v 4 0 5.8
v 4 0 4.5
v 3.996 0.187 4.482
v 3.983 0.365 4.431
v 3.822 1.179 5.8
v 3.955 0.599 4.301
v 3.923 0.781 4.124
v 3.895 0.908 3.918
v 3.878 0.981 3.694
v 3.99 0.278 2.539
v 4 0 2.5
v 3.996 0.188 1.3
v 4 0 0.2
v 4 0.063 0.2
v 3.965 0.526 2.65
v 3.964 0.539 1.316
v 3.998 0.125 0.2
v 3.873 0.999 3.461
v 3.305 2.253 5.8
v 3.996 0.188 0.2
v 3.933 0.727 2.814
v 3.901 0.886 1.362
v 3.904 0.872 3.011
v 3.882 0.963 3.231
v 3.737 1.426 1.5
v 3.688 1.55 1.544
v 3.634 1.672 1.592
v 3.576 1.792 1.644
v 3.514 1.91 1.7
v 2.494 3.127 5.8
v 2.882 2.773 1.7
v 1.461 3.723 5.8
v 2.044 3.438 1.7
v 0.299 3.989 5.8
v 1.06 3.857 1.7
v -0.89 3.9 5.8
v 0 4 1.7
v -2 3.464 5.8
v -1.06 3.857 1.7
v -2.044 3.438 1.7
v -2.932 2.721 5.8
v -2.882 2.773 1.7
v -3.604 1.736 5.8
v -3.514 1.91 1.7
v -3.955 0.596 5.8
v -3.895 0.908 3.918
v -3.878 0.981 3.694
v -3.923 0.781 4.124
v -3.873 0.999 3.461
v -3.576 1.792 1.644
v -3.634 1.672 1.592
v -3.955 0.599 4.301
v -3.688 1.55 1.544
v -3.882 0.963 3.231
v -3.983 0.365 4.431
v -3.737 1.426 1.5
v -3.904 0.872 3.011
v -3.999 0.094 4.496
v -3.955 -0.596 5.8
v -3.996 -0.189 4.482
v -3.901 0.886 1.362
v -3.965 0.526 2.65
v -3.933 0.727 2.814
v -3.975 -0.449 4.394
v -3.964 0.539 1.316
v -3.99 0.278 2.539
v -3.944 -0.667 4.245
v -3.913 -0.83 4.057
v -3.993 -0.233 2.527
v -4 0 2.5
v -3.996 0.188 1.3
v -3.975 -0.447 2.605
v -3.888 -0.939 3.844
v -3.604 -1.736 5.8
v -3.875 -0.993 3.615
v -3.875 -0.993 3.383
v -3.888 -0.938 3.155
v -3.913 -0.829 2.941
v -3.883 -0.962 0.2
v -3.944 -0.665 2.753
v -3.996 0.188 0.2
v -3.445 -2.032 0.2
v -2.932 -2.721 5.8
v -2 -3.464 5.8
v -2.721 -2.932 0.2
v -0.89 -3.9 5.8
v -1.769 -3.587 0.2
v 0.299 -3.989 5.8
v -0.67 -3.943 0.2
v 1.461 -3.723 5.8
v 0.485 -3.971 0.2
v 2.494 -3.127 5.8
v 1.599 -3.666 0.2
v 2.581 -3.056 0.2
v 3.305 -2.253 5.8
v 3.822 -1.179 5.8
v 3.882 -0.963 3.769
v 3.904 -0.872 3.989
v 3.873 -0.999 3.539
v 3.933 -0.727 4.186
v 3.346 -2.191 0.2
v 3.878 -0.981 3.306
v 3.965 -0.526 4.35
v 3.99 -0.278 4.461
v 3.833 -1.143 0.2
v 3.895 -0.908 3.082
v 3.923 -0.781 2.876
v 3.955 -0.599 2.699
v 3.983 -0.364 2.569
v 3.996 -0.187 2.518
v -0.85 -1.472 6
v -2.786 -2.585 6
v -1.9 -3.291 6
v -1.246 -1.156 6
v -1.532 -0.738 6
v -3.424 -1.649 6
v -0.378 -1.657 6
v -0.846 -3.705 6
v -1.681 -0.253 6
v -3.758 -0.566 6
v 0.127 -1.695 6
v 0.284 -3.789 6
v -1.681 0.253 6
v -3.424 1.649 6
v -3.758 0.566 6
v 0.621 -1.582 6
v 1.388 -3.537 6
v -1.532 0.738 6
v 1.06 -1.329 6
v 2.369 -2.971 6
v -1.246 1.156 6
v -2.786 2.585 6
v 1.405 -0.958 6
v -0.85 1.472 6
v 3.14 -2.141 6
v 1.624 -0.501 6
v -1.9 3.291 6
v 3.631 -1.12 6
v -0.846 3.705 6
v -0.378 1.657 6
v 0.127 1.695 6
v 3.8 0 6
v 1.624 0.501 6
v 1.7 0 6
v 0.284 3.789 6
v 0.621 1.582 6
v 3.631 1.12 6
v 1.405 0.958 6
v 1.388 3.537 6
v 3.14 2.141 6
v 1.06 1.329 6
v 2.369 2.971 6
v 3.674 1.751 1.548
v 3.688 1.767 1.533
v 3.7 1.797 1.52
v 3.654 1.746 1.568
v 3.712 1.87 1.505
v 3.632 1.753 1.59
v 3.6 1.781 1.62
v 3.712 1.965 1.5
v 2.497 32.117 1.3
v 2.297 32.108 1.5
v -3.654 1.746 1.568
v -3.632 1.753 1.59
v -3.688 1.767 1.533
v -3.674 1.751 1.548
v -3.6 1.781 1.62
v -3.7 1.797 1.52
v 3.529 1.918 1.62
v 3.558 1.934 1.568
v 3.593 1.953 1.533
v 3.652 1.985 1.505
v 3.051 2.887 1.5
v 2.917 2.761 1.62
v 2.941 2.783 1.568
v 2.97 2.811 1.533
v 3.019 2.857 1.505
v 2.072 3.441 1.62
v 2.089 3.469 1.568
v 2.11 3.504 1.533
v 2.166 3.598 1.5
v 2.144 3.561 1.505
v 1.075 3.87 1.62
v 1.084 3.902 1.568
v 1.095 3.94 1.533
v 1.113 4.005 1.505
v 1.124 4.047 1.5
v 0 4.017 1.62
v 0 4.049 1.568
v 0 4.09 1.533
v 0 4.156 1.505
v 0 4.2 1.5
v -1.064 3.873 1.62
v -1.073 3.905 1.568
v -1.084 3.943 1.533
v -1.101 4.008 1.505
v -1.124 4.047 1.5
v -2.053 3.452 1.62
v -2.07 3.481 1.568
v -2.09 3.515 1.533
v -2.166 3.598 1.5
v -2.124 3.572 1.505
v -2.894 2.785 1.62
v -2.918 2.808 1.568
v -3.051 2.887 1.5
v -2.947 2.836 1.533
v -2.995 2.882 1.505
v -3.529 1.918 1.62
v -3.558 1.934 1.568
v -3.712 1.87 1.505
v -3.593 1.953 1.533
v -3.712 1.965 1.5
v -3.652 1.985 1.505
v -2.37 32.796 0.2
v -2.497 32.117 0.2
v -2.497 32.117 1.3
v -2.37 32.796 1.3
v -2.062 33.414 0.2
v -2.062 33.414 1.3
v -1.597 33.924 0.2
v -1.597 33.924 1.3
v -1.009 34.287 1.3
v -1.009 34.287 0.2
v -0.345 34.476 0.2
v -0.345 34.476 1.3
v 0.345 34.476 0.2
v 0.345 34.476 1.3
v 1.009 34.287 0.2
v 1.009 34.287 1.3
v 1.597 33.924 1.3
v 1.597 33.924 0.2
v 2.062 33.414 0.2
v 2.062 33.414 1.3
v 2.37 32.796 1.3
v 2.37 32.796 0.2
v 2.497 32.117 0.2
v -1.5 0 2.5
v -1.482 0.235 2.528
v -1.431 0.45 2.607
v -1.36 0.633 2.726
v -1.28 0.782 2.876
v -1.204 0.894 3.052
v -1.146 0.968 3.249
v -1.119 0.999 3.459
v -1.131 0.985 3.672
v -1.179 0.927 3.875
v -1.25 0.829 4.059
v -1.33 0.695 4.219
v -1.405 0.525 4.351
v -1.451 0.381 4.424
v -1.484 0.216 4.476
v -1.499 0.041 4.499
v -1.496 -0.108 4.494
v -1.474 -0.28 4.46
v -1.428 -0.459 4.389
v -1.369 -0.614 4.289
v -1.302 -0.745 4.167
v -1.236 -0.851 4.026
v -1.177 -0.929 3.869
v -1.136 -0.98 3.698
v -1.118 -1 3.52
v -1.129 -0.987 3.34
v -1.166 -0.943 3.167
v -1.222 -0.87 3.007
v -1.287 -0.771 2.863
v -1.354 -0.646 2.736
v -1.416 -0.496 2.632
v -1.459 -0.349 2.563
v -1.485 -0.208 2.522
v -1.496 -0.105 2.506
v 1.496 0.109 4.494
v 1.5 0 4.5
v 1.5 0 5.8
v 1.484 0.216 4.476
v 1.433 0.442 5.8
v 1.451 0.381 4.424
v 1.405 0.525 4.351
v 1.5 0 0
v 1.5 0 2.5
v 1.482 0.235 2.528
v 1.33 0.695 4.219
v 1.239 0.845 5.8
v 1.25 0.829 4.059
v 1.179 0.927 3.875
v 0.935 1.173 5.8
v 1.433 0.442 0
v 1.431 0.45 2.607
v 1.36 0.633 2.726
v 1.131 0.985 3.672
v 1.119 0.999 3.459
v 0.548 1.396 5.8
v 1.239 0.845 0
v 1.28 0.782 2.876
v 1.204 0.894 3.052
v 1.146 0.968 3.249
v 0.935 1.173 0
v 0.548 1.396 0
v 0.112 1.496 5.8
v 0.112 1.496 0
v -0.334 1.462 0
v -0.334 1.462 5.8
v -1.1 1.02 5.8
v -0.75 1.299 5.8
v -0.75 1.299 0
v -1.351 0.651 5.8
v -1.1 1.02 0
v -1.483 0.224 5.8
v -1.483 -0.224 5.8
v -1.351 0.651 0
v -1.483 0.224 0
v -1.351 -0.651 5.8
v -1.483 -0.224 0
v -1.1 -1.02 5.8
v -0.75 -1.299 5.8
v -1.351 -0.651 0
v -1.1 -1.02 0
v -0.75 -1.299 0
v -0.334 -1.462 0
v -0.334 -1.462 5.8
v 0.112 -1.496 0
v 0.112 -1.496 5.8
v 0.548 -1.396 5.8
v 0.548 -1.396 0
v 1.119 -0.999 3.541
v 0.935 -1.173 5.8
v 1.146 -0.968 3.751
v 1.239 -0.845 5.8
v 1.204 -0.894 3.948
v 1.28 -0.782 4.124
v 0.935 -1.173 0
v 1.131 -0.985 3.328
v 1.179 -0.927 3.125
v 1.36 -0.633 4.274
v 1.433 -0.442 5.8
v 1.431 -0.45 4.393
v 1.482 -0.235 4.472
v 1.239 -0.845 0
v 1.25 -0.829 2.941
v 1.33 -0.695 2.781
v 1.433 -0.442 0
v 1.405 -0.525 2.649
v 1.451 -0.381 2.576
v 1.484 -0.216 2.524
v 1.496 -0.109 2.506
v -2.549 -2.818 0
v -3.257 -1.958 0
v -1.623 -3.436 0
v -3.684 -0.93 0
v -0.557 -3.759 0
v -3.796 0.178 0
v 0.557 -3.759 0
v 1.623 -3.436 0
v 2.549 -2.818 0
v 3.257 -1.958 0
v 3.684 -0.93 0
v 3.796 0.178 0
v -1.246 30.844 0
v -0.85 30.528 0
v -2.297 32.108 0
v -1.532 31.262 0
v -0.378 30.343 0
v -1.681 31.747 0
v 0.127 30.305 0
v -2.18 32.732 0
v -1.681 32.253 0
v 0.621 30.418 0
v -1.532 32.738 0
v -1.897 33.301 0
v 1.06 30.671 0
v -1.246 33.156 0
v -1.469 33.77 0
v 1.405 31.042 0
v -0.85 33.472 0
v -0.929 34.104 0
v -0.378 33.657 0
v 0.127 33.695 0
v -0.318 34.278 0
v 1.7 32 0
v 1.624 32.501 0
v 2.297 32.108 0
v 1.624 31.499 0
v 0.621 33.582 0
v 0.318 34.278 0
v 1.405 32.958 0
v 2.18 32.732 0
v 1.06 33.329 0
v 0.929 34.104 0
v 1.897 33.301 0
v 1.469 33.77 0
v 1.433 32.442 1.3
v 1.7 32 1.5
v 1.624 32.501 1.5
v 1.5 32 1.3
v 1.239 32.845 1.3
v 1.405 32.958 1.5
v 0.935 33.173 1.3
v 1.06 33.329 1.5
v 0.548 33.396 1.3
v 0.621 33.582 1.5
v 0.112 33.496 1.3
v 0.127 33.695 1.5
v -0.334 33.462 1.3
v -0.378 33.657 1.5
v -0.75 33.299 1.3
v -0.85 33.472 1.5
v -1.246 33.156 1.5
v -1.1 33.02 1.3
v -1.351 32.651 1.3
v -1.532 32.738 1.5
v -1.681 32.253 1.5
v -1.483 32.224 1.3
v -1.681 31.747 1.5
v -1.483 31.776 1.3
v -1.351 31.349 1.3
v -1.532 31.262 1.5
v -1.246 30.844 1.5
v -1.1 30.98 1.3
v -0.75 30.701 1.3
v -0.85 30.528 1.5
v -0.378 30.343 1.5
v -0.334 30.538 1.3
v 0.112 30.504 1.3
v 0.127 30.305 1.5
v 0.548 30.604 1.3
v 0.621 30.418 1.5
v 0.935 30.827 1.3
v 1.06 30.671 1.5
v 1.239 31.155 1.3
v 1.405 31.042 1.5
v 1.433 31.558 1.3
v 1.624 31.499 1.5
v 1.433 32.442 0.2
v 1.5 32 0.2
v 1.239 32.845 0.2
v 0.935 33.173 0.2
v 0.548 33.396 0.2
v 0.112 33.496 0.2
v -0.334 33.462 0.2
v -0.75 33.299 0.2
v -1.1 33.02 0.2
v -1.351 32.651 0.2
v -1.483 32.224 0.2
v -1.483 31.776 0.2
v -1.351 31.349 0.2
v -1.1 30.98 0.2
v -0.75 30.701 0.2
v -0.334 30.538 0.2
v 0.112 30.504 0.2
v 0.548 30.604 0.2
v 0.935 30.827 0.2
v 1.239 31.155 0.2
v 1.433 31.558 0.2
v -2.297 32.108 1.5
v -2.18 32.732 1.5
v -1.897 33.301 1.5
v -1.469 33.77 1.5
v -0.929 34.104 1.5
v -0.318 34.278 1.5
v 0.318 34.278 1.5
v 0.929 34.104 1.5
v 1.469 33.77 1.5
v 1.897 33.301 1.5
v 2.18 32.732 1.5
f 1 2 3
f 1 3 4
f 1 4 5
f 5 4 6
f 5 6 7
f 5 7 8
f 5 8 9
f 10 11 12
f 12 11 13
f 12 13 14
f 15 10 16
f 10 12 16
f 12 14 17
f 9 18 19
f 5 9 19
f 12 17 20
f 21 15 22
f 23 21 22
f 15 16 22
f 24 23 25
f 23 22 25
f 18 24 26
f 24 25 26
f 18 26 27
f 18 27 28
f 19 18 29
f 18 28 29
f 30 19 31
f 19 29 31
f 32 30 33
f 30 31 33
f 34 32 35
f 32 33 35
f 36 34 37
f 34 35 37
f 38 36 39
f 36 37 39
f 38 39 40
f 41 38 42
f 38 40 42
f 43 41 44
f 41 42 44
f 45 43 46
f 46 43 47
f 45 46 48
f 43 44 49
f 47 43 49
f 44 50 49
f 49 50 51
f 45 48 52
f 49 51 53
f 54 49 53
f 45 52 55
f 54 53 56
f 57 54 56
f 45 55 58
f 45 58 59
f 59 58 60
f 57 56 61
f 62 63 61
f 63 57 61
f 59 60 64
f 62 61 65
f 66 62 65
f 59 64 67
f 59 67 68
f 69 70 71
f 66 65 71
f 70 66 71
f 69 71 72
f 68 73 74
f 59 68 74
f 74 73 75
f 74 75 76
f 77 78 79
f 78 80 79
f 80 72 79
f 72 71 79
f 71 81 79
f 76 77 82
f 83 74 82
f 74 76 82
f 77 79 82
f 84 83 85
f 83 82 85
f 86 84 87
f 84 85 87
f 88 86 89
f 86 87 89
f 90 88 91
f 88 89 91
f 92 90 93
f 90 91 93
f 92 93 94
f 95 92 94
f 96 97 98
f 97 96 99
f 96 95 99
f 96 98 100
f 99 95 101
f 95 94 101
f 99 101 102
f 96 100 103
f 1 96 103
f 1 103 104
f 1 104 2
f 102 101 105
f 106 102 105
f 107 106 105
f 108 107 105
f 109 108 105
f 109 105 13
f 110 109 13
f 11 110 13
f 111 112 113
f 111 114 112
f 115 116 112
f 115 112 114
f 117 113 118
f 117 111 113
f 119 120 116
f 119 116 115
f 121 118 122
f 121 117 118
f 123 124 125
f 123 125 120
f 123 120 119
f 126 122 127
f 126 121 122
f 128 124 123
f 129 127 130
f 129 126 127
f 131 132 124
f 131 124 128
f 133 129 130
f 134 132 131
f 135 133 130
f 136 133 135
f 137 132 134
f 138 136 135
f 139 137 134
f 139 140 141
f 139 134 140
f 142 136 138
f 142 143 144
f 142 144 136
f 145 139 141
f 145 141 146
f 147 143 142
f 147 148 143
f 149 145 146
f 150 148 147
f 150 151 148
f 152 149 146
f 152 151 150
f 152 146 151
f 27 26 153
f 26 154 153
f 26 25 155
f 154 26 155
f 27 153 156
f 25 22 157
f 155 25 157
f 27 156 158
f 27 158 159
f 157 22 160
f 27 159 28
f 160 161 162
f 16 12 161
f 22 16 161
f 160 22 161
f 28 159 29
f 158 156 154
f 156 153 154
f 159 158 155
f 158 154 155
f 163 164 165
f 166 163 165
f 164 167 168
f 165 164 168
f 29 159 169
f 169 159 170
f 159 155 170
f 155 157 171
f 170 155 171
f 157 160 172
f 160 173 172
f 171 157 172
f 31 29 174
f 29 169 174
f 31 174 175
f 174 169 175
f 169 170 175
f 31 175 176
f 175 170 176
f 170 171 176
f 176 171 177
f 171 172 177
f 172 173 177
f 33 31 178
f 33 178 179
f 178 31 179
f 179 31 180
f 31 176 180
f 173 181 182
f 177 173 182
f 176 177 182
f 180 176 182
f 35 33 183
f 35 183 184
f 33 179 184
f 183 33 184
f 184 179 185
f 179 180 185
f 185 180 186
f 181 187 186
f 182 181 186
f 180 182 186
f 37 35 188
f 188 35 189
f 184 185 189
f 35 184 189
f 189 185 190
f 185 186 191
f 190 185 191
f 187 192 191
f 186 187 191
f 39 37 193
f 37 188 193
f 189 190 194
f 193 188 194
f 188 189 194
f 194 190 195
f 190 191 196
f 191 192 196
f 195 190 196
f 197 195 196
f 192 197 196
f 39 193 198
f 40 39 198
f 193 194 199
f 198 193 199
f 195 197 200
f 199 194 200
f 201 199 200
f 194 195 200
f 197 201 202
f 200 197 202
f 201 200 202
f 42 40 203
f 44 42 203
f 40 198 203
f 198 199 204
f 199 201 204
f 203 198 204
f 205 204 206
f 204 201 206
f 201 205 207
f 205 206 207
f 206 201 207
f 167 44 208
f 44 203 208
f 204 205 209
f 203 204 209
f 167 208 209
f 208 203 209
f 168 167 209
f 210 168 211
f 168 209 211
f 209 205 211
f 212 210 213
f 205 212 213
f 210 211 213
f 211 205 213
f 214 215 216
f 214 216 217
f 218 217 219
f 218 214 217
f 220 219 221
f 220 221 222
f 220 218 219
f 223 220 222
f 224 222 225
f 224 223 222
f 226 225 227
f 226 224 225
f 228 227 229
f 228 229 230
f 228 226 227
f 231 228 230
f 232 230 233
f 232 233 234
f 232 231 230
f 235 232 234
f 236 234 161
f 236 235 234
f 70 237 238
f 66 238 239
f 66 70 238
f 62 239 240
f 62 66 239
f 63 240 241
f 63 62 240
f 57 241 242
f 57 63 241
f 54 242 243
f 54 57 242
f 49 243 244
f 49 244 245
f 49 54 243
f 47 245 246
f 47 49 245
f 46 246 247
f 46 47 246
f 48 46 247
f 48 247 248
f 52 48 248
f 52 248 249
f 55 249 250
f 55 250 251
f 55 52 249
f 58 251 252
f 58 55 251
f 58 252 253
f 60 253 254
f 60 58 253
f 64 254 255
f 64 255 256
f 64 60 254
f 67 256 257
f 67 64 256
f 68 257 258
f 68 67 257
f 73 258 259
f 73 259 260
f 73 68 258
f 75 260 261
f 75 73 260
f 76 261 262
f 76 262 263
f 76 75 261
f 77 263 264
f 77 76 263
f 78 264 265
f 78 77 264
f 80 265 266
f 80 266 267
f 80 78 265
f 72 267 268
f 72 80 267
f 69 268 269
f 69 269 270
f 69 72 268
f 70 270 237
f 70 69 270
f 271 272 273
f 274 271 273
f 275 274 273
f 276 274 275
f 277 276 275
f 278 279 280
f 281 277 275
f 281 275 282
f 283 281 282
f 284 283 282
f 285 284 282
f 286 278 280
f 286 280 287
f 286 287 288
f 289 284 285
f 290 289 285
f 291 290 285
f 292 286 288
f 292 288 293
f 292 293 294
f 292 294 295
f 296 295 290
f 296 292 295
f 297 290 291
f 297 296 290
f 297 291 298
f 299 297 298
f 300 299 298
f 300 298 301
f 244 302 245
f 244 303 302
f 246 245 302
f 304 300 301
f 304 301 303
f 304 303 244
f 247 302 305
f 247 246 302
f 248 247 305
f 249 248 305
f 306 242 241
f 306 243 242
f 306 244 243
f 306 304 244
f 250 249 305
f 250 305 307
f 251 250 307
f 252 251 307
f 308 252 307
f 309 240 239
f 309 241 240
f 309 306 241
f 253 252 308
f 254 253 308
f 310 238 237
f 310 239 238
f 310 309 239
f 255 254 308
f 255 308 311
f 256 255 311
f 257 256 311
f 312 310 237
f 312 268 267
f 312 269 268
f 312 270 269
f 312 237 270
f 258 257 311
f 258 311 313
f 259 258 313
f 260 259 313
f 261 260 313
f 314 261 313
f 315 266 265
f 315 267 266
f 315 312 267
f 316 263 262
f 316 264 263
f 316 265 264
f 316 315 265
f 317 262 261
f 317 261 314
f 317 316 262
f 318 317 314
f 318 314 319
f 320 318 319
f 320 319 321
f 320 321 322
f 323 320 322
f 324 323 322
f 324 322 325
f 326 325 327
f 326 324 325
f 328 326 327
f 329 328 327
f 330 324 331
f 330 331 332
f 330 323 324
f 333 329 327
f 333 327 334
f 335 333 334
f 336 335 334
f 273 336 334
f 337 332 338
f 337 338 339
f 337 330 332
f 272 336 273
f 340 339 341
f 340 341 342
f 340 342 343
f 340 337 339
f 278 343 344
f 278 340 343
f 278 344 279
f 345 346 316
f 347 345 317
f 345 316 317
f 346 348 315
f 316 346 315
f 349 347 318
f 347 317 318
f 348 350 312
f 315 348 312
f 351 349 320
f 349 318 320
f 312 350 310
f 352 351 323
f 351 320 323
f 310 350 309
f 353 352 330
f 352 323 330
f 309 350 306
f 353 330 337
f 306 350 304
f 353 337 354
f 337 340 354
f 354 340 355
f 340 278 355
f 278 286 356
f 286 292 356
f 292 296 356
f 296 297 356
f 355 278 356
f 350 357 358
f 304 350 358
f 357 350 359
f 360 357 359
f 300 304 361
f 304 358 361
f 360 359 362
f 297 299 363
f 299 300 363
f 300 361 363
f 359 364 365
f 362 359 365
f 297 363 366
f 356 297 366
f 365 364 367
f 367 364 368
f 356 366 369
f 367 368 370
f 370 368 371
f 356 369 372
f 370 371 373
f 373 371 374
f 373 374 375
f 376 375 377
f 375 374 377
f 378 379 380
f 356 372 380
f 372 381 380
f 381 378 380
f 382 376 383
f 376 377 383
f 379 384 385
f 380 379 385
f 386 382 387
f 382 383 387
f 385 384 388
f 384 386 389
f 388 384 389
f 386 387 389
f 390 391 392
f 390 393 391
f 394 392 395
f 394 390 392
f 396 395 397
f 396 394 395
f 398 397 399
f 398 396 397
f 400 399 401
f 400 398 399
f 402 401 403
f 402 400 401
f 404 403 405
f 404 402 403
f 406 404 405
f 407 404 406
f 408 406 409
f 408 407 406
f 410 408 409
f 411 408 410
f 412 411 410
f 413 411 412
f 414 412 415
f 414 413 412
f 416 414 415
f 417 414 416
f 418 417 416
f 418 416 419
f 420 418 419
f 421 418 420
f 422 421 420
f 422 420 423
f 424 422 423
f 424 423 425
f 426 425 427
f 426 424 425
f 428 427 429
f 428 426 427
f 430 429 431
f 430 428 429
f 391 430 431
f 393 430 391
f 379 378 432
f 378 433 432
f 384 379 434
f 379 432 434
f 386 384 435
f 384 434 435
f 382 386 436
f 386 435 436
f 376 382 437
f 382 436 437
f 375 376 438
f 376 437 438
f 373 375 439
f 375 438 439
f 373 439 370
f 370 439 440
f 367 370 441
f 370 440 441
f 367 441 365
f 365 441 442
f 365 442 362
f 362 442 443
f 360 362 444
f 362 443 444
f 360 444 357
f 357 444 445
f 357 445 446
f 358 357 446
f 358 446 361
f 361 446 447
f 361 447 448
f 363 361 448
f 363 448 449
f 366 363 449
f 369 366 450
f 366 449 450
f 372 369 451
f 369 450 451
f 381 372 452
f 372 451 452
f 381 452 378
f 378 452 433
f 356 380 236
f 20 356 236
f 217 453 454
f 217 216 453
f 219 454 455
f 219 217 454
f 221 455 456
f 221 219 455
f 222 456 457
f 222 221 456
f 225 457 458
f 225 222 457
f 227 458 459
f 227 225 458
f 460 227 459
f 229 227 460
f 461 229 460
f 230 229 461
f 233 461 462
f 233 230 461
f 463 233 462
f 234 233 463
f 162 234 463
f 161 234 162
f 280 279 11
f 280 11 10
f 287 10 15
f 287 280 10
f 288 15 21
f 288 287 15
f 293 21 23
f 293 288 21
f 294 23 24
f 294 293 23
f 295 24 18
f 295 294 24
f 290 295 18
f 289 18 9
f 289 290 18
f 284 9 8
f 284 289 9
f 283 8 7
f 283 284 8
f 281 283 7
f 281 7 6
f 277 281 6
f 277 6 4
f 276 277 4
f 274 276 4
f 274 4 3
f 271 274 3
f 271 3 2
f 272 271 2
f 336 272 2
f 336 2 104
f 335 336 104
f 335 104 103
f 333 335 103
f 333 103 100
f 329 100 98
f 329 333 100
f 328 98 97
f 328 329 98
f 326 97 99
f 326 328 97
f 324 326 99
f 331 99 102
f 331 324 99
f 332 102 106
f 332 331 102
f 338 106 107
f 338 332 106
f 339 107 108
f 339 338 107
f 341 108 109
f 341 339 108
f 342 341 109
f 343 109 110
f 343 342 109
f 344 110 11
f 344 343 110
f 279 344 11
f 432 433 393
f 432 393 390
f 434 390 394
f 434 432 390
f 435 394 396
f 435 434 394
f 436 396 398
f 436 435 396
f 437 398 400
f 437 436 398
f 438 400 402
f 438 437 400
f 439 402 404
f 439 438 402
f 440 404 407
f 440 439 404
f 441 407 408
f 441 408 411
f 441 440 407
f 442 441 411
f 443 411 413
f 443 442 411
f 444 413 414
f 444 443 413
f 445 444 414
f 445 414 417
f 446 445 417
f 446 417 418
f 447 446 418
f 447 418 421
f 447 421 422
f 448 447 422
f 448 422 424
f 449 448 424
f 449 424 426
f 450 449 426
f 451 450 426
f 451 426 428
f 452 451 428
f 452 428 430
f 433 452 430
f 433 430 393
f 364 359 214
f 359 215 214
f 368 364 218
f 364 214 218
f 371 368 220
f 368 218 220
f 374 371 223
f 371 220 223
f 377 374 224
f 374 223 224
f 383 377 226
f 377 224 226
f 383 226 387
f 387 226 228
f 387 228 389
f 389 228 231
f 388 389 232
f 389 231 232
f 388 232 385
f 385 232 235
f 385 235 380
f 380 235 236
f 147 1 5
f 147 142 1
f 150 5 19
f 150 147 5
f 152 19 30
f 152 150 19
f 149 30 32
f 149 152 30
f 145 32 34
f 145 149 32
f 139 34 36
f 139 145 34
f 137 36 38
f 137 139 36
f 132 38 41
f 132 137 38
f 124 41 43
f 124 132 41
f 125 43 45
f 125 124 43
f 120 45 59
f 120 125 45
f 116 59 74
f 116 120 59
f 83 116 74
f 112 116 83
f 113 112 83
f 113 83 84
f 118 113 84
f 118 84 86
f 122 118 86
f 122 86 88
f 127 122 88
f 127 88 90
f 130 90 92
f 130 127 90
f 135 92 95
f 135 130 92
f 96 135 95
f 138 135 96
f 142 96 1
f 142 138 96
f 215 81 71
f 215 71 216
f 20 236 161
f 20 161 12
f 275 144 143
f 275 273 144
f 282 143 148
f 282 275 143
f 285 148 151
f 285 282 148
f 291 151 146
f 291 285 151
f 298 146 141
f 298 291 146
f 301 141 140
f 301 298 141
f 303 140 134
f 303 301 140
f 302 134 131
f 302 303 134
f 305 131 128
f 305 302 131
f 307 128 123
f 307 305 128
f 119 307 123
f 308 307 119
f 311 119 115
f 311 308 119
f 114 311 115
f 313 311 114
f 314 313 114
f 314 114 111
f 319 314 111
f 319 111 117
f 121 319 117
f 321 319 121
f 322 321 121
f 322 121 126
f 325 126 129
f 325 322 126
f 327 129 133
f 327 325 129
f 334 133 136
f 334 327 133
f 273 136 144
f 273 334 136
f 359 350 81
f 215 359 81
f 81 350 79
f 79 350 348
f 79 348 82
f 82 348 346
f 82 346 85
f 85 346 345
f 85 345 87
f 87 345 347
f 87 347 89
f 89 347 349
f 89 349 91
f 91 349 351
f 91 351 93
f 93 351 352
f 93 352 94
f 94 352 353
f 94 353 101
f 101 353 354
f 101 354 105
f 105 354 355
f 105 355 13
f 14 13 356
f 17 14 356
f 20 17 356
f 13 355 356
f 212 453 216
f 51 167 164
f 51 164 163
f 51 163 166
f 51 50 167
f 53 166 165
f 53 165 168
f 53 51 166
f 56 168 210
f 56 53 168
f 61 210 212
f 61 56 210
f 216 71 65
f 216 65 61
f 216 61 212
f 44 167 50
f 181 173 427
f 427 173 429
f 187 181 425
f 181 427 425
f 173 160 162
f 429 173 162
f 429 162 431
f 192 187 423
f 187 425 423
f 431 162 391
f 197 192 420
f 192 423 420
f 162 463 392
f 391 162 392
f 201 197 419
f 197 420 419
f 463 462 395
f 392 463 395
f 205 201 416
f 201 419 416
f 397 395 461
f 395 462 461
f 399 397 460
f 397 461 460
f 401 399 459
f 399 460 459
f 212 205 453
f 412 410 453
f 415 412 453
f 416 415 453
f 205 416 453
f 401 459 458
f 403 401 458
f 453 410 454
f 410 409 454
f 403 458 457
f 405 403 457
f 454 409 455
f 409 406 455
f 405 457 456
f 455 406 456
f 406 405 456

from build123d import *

# Parameters (mm, degrees)
SKETCH1_R               = 4
SKETCH1_R_2             = 1.5
BOSS_EXTRUDE1_DEPTH     = 6
SKETCH2_R               = 1.5000000000000004
BOSS_EXTRUDE2_DEPTH     = 1.5
CUT_EXTRUDE1_DEPTH      = 36.245567097154215
CUT_EXTRUDE1_DEPTH_BACK = 36.245567097154215
SKETCH3_R               = 1.0000000000000002
CHAMFER1_SIZE           = 0.2
FILLET1_R               = 0.2


with BuildPart() as part:
    # Sketch1 → Boss-Extrude1 (new body)
    with BuildSketch(Plane.XY):
        Circle(SKETCH1_R)
        Circle(SKETCH1_R_2, mode=Mode.SUBTRACT)
    extrude(amount=BOSS_EXTRUDE1_DEPTH)

    # Sketch2 → Boss-Extrude2 (add)
    with BuildSketch(Plane.XY):
        with BuildLine():
            Line((-3.995603052106154, 0.18750000000000017), (-2.4972519075663464, 32.1171875))
            ThreePointArc((-2.4972519075663464, 32.1171875), (1.5e-16, 34.5), (2.4972519075663464, 32.1171875))
            Line((2.4972519075663464, 32.1171875), (3.995603052106154, 0.18750000000000017))
            ThreePointArc((3.995603052106154, 0.18750000000000017), (2.4e-16, 4.000000000000002), (-3.995603052106154, 0.18750000000000017))
        make_face()
        with Locations((0, 32)):
            Circle(SKETCH2_R, mode=Mode.SUBTRACT)
    extrude(amount=BOSS_EXTRUDE2_DEPTH)

    # Sketch3 → Cut-Extrude1 (cut, two sides: drawn at the far end of the back side and taken through both)
    with BuildSketch(Plane(origin=(0, 0, 0), x_dir=(0, 0, -1), z_dir=(1, 0, 0)).offset(-CUT_EXTRUDE1_DEPTH_BACK)):
        with Locations((-3.5, 0)):
            Circle(SKETCH3_R)
    extrude(amount=CUT_EXTRUDE1_DEPTH + CUT_EXTRUDE1_DEPTH_BACK, mode=Mode.SUBTRACT)

    # Chamfer1
    # the kernel refuses this chamfer: 0.2 mm, written as the material it takes off along each edge
    with BuildSketch(Plane(origin=(0, 0, 0), x_dir=(-0.9989007630265381, 0.04687500000000028, 0), z_dir=(0.04687500000000028, 0.9989007630265381, 0))) as chamfer1_piece_1:
        Polygon((4, CHAMFER1_SIZE), (4 - CHAMFER1_SIZE, 0), (4, 0), align=None)
    revolve(axis=Axis((0, 0, 0), (0, 0, 1)), revolution_arc=182.68672418569162, mode=Mode.SUBTRACT)
    with BuildSketch(Plane(origin=(2.4972519075663464, 32.1171875, 1.5), x_dir=(0.027465652126399, 0.0012888692161212708, -0.9996219169112966), z_dir=(0.04687500000000002, -0.9989007630265381, 0))) as chamfer1_piece_2_section:
        Polygon((CHAMFER1_SIZE * 0.999621916911, -CHAMFER1_SIZE * 0.0274958766106), (-CHAMFER1_SIZE * 0.0274958766106, -CHAMFER1_SIZE * 0.999621916911), (0, 0), align=None)
    chamfer1_piece_2 = extrude(amount=32.4791610144424, mode=Mode.PRIVATE)
    chamfer1_piece_2 = chamfer1_piece_2 - Plane(origin=(0, 0, 1.4336940433446623), x_dir=(1, 0, 0), z_dir=(0, 0, -1)) * Cylinder(4, 66, mode=Mode.PRIVATE)
    add(chamfer1_piece_2, mode=Mode.SUBTRACT)
    with BuildSketch(Plane(origin=(1.1e-16, 32, 1.5), x_dir=(-0.9989007630265381, 0.04687499999999997, 0), z_dir=(-0.04687499999999997, -0.9989007630265381, 0))) as chamfer1_piece_3:
        Polygon((2.5000000000000013 - CHAMFER1_SIZE, 0), (2.5000000000000013, CHAMFER1_SIZE), (2.5000000000000013, 0), align=None)
    revolve(axis=Axis((1.1e-16, 32, 1.5), (0, 0, -1)), revolution_arc=174.62655162861682, mode=Mode.SUBTRACT)
    with BuildSketch(Plane(origin=(-4.019712580118334, -0.32627121978830154, 1.5), x_dir=(0.9985230955407449, -0.046857277355217046, 0.027495876610586282), z_dir=(0.04687500000000002, 0.9989007630265381, 0))) as chamfer1_piece_4_section:
        Polygon((CHAMFER1_SIZE * 0.999621916911, CHAMFER1_SIZE * 0.0274958766106), (-CHAMFER1_SIZE * 0.0274958766106, CHAMFER1_SIZE * 0.999621916911), (0, 0), align=None)
    chamfer1_piece_4 = extrude(amount=32.479161014442404, mode=Mode.PRIVATE)
    chamfer1_piece_4 = chamfer1_piece_4 - Plane(origin=(0, 0, 1.433694043044513), x_dir=(1, 0, 0), z_dir=(0, 0, -1)) * Cylinder(4, 66, mode=Mode.PRIVATE)
    add(chamfer1_piece_4, mode=Mode.SUBTRACT)
    with BuildSketch(Plane(origin=(0, 32, 0), x_dir=(1, 0, 0), z_dir=(0, -1, 0))) as chamfer1_piece_5:
        Polygon((1.5000000000000004 + CHAMFER1_SIZE, 0), (1.5000000000000004, CHAMFER1_SIZE), (1.5000000000000004, 0), align=None)
    revolve(axis=Axis((0, 32, 0), (0, 0, 1)), mode=Mode.SUBTRACT)
    with BuildSketch(Plane(origin=(2.4972519075663464, 32.1171875, 0), x_dir=(-0.9985230955407451, -0.04685727735521706, -0.02749587661058638), z_dir=(0.04687500000000002, -0.9989007630265381, 0))) as chamfer1_piece_6:
        Polygon((CHAMFER1_SIZE * 0.999621916911, -CHAMFER1_SIZE * 0.0274958766106), (-CHAMFER1_SIZE * 0.0274958766106, -CHAMFER1_SIZE * 0.999621916911), (0, 0), align=None)
    extrude(amount=31.96482441684922, mode=Mode.SUBTRACT)
    with BuildSketch(Plane(origin=(1.1e-16, 32, 0), x_dir=(-0.9989007630265381, 0.04687499999999997, 0), z_dir=(-0.04687499999999997, -0.9989007630265381, 0))) as chamfer1_piece_7:
        Polygon((2.5000000000000013 - CHAMFER1_SIZE, 0), (2.5000000000000013, -CHAMFER1_SIZE), (2.5000000000000013, 0), align=None)
    revolve(axis=Axis((1.1e-16, 32, 0), (0, 0, -1)), revolution_arc=174.62655162861682, mode=Mode.SUBTRACT)
    with BuildSketch(Plane(origin=(-3.995603052106154, 0.18750000000000017, 0), x_dir=(0.9985230955407449, -0.04685727735521705, -0.027495876610586376), z_dir=(0.04687500000000002, 0.9989007630265381, 0))) as chamfer1_piece_8:
        Polygon((CHAMFER1_SIZE * 0.999621916911, -CHAMFER1_SIZE * 0.0274958766106), (-CHAMFER1_SIZE * 0.0274958766106, -CHAMFER1_SIZE * 0.999621916911), (0, 0), align=None)
    extrude(amount=31.96482441684922, mode=Mode.SUBTRACT)
    with BuildSketch(Plane(origin=(0, 32, 1.5), x_dir=(1, 0, 0), z_dir=(0, -1, 0))) as chamfer1_piece_9:
        Polygon((1.5000000000000004 + CHAMFER1_SIZE, 0), (1.5000000000000004, -CHAMFER1_SIZE), (1.5000000000000004, 0), align=None)
    revolve(axis=Axis((0, 32, 1.5), (0, 0, 1)), mode=Mode.SUBTRACT)
    with BuildSketch(Plane(origin=(0, 0, 6), x_dir=(1, 0, 0), z_dir=(0, -1, 0))) as chamfer1_piece_10:
        Polygon((4, -CHAMFER1_SIZE), (4 - CHAMFER1_SIZE, 0), (4, 0), align=None)
    revolve(axis=Axis((0, 0, 6), (0, 0, 1)), mode=Mode.SUBTRACT)
    with BuildSketch(Plane(origin=(0, 0, 6), x_dir=(1, 0, 0), z_dir=(0, -1, 0))) as chamfer1_piece_11:
        Polygon((1.5 + CHAMFER1_SIZE, 0), (1.5, -CHAMFER1_SIZE), (1.5, 0), align=None)
    revolve(axis=Axis((0, 0, 6), (0, 0, 1)), mode=Mode.SUBTRACT)
    with BuildSketch(Plane(origin=(0, 0, 0), x_dir=(1, 0, 0), z_dir=(0, -1, 0))) as chamfer1_piece_12:
        Polygon((4, CHAMFER1_SIZE), (4 - CHAMFER1_SIZE, 0), (4, 0), align=None)
    revolve(axis=Axis((0, 0, 0), (0, 0, 1)), revolution_arc=2.686724185691597, mode=Mode.SUBTRACT)

    # Fillet1
    fillet1_edges = [part.edges().sort_by_distance(p)[0] for p in [
        (-1.15197e-12, 4.000000000000002, 1.5),
    ]]
    fillet(fillet1_edges, radius=FILLET1_R)


solid = part.part
